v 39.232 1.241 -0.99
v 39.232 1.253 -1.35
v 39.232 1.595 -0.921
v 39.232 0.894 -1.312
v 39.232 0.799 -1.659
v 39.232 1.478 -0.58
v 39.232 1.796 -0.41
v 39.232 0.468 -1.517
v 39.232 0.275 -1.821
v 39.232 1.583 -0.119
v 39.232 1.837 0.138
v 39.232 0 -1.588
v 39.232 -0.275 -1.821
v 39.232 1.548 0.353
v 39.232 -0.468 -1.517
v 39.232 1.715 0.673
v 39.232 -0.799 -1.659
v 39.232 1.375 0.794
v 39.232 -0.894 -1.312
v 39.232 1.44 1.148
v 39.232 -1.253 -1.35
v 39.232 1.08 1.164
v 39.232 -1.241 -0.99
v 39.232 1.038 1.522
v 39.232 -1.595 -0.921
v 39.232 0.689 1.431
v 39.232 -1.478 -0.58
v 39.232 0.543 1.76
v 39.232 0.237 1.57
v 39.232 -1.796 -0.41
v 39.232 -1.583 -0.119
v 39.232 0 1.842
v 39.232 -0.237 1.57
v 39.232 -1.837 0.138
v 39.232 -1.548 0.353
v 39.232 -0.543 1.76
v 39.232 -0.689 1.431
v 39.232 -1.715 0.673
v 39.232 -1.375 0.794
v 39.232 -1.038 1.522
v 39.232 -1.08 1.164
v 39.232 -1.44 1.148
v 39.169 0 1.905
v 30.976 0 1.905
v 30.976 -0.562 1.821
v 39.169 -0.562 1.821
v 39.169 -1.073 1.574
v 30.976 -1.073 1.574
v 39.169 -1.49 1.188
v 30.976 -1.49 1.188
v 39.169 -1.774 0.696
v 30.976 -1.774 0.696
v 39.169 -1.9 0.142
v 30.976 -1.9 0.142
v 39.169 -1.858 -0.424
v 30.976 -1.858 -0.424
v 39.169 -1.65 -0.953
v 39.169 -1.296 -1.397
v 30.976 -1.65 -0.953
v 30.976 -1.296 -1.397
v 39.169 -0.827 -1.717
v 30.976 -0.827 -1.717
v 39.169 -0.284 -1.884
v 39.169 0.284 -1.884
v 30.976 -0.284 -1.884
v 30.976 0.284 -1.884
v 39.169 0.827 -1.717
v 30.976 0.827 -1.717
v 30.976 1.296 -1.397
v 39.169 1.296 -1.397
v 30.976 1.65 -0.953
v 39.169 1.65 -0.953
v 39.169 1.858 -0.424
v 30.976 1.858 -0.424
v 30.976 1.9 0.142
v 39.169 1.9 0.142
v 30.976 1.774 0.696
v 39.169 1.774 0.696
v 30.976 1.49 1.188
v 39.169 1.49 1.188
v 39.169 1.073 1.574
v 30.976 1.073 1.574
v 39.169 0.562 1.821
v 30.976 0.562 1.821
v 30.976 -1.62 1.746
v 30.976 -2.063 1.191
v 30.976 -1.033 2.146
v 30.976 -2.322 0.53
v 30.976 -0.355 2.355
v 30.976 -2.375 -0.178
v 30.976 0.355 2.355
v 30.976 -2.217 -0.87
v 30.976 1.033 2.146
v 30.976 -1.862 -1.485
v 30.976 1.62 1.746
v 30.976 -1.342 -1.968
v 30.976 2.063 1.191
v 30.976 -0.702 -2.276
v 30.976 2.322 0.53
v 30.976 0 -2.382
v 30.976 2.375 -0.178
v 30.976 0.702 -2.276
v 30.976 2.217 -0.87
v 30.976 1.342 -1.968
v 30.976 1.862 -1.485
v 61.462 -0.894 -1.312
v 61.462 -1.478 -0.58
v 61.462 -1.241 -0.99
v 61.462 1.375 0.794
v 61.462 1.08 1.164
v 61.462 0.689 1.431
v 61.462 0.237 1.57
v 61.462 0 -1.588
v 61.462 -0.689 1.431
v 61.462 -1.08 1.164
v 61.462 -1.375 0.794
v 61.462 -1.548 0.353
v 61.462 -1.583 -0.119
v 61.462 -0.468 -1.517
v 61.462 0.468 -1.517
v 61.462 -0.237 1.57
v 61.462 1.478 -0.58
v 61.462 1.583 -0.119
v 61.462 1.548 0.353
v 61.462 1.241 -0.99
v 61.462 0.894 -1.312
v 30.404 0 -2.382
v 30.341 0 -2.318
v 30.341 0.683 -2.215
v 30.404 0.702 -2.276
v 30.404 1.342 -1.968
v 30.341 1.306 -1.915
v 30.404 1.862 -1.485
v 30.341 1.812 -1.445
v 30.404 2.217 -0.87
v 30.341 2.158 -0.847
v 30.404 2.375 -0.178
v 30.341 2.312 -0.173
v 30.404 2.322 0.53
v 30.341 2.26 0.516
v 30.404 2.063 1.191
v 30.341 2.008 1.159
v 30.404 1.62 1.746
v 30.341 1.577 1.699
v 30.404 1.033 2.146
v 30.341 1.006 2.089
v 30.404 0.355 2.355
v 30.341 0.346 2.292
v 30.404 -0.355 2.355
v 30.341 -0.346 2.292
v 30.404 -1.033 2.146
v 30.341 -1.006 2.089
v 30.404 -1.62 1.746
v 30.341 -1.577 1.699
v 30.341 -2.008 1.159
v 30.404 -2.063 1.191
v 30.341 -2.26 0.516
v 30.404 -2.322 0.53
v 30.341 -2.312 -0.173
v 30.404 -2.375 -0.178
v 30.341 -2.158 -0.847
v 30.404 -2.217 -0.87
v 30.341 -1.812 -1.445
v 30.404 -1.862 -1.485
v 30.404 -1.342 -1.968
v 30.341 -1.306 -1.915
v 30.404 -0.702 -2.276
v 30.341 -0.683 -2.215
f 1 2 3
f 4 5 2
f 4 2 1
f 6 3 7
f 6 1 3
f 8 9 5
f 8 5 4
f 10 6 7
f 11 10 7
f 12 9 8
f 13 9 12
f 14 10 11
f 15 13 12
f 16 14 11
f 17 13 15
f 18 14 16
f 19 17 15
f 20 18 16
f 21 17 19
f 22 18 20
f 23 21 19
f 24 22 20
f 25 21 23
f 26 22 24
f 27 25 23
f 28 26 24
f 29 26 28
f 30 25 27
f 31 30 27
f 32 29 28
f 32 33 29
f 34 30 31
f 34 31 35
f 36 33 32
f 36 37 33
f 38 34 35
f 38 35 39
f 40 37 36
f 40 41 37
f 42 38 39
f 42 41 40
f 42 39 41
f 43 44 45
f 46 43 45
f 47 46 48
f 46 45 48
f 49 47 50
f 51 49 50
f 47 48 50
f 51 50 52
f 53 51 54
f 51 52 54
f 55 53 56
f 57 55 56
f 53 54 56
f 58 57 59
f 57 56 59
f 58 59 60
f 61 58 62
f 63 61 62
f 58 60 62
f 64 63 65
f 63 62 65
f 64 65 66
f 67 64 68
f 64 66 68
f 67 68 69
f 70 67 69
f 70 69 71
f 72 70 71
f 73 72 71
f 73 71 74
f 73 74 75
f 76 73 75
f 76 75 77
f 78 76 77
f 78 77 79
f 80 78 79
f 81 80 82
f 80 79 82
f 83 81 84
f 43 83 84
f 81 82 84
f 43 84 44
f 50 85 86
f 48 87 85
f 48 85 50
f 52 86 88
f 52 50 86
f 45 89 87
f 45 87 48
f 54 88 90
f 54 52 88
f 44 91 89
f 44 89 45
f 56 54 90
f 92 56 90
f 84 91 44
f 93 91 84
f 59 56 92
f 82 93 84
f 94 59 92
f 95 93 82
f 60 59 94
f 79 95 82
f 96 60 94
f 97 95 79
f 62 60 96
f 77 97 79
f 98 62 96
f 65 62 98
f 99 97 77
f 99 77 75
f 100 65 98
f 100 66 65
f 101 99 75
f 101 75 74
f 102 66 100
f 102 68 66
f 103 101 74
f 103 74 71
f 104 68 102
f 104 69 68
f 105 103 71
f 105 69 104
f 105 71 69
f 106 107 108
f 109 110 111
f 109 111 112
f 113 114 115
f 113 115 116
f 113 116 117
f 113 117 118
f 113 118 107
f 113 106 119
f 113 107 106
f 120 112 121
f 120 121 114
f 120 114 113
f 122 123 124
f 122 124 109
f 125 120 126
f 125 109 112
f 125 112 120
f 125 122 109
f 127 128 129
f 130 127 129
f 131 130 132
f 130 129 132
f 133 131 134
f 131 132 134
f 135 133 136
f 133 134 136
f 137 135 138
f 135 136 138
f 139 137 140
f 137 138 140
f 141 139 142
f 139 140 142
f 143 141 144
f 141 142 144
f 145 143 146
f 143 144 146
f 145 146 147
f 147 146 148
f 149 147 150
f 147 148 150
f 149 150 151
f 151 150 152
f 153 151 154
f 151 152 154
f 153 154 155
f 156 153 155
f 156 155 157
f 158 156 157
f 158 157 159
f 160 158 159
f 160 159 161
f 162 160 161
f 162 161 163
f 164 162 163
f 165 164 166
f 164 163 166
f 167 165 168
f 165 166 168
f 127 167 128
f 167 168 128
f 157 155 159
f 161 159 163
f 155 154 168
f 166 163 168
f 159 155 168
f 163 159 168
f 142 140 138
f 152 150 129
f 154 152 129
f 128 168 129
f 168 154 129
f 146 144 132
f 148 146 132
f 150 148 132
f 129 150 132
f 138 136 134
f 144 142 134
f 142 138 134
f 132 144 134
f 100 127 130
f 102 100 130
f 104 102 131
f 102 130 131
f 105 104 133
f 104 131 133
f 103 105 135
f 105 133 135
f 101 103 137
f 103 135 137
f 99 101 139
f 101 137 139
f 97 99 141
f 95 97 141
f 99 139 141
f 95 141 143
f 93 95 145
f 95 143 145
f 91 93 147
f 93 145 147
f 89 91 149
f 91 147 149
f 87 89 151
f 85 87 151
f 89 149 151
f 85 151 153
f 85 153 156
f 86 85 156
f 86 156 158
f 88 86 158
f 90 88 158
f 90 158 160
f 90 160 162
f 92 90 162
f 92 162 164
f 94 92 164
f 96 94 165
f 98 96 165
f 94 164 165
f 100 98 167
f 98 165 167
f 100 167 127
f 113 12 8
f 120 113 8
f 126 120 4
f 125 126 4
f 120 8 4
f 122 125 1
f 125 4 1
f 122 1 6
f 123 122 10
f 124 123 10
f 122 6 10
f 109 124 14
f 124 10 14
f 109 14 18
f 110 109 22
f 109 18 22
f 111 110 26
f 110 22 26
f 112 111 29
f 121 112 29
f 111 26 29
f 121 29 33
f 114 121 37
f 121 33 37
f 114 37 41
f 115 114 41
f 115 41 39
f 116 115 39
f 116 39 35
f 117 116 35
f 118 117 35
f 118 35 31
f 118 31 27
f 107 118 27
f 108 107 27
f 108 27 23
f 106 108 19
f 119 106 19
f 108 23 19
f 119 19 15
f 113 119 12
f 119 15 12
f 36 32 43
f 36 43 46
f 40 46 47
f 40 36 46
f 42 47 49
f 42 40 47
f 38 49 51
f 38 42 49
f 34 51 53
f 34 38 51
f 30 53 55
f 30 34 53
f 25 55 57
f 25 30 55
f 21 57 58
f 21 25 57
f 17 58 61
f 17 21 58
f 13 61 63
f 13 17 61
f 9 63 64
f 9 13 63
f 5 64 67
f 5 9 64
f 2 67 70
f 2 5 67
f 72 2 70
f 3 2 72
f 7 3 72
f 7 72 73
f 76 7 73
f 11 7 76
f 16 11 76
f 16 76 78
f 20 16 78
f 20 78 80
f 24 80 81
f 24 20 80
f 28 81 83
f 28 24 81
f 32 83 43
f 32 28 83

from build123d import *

# Parameters (mm, degrees)
SKETCH1_R           = 7.5
BOSS_EXTRUDE1_DEPTH = 2
SKETCH2_R           = 6
BOSS_EXTRUDE2_DEPTH = 26
SKETCH3_R           = 5
BOSS_EXTRUDE3_DEPTH = 70
CHAMFER1_SIZE       = 0.2
SCALE1_SCALE        = 0.317565217


with BuildPart() as part:
    # Sketch1 → Boss-Extrude1 (new body)
    with BuildSketch(Plane(origin=(0, 0, 0), x_dir=(0, 0, -1), z_dir=(1, 0, 0))):
        Circle(SKETCH1_R)
    extrude(amount=BOSS_EXTRUDE1_DEPTH)

    # Sketch2 → Boss-Extrude2 (add)
    with BuildSketch(Plane(origin=(2, 0, 0), x_dir=(0, 0, -1), z_dir=(1, 0, 0))):
        with Locations(Location((0, 0, 0), (0, 0, 180))):
            Circle(SKETCH2_R)
    extrude(amount=BOSS_EXTRUDE2_DEPTH)

    # Sketch3 → Boss-Extrude3 (add)
    with BuildSketch(Plane(origin=(28, 0, 0), x_dir=(0, 0, -1), z_dir=(1, 0, 0))):
        Circle(SKETCH3_R)
    extrude(amount=BOSS_EXTRUDE3_DEPTH)

    # Chamfer1
    chamfer1_edges = [part.edges().sort_by_distance(p)[0] for p in [
        (0, 0, 7.5),
        (28, 0, -6),
    ]]
    chamfer(chamfer1_edges, length=CHAMFER1_SIZE)


with BuildPart() as part_1:
    # Scale1: scaled about (44.459396685, 0, 0)
    add(part.part.scale(SCALE1_SCALE).moved(Location((30.340638712, 0, 0))))


solid = part_1.part
